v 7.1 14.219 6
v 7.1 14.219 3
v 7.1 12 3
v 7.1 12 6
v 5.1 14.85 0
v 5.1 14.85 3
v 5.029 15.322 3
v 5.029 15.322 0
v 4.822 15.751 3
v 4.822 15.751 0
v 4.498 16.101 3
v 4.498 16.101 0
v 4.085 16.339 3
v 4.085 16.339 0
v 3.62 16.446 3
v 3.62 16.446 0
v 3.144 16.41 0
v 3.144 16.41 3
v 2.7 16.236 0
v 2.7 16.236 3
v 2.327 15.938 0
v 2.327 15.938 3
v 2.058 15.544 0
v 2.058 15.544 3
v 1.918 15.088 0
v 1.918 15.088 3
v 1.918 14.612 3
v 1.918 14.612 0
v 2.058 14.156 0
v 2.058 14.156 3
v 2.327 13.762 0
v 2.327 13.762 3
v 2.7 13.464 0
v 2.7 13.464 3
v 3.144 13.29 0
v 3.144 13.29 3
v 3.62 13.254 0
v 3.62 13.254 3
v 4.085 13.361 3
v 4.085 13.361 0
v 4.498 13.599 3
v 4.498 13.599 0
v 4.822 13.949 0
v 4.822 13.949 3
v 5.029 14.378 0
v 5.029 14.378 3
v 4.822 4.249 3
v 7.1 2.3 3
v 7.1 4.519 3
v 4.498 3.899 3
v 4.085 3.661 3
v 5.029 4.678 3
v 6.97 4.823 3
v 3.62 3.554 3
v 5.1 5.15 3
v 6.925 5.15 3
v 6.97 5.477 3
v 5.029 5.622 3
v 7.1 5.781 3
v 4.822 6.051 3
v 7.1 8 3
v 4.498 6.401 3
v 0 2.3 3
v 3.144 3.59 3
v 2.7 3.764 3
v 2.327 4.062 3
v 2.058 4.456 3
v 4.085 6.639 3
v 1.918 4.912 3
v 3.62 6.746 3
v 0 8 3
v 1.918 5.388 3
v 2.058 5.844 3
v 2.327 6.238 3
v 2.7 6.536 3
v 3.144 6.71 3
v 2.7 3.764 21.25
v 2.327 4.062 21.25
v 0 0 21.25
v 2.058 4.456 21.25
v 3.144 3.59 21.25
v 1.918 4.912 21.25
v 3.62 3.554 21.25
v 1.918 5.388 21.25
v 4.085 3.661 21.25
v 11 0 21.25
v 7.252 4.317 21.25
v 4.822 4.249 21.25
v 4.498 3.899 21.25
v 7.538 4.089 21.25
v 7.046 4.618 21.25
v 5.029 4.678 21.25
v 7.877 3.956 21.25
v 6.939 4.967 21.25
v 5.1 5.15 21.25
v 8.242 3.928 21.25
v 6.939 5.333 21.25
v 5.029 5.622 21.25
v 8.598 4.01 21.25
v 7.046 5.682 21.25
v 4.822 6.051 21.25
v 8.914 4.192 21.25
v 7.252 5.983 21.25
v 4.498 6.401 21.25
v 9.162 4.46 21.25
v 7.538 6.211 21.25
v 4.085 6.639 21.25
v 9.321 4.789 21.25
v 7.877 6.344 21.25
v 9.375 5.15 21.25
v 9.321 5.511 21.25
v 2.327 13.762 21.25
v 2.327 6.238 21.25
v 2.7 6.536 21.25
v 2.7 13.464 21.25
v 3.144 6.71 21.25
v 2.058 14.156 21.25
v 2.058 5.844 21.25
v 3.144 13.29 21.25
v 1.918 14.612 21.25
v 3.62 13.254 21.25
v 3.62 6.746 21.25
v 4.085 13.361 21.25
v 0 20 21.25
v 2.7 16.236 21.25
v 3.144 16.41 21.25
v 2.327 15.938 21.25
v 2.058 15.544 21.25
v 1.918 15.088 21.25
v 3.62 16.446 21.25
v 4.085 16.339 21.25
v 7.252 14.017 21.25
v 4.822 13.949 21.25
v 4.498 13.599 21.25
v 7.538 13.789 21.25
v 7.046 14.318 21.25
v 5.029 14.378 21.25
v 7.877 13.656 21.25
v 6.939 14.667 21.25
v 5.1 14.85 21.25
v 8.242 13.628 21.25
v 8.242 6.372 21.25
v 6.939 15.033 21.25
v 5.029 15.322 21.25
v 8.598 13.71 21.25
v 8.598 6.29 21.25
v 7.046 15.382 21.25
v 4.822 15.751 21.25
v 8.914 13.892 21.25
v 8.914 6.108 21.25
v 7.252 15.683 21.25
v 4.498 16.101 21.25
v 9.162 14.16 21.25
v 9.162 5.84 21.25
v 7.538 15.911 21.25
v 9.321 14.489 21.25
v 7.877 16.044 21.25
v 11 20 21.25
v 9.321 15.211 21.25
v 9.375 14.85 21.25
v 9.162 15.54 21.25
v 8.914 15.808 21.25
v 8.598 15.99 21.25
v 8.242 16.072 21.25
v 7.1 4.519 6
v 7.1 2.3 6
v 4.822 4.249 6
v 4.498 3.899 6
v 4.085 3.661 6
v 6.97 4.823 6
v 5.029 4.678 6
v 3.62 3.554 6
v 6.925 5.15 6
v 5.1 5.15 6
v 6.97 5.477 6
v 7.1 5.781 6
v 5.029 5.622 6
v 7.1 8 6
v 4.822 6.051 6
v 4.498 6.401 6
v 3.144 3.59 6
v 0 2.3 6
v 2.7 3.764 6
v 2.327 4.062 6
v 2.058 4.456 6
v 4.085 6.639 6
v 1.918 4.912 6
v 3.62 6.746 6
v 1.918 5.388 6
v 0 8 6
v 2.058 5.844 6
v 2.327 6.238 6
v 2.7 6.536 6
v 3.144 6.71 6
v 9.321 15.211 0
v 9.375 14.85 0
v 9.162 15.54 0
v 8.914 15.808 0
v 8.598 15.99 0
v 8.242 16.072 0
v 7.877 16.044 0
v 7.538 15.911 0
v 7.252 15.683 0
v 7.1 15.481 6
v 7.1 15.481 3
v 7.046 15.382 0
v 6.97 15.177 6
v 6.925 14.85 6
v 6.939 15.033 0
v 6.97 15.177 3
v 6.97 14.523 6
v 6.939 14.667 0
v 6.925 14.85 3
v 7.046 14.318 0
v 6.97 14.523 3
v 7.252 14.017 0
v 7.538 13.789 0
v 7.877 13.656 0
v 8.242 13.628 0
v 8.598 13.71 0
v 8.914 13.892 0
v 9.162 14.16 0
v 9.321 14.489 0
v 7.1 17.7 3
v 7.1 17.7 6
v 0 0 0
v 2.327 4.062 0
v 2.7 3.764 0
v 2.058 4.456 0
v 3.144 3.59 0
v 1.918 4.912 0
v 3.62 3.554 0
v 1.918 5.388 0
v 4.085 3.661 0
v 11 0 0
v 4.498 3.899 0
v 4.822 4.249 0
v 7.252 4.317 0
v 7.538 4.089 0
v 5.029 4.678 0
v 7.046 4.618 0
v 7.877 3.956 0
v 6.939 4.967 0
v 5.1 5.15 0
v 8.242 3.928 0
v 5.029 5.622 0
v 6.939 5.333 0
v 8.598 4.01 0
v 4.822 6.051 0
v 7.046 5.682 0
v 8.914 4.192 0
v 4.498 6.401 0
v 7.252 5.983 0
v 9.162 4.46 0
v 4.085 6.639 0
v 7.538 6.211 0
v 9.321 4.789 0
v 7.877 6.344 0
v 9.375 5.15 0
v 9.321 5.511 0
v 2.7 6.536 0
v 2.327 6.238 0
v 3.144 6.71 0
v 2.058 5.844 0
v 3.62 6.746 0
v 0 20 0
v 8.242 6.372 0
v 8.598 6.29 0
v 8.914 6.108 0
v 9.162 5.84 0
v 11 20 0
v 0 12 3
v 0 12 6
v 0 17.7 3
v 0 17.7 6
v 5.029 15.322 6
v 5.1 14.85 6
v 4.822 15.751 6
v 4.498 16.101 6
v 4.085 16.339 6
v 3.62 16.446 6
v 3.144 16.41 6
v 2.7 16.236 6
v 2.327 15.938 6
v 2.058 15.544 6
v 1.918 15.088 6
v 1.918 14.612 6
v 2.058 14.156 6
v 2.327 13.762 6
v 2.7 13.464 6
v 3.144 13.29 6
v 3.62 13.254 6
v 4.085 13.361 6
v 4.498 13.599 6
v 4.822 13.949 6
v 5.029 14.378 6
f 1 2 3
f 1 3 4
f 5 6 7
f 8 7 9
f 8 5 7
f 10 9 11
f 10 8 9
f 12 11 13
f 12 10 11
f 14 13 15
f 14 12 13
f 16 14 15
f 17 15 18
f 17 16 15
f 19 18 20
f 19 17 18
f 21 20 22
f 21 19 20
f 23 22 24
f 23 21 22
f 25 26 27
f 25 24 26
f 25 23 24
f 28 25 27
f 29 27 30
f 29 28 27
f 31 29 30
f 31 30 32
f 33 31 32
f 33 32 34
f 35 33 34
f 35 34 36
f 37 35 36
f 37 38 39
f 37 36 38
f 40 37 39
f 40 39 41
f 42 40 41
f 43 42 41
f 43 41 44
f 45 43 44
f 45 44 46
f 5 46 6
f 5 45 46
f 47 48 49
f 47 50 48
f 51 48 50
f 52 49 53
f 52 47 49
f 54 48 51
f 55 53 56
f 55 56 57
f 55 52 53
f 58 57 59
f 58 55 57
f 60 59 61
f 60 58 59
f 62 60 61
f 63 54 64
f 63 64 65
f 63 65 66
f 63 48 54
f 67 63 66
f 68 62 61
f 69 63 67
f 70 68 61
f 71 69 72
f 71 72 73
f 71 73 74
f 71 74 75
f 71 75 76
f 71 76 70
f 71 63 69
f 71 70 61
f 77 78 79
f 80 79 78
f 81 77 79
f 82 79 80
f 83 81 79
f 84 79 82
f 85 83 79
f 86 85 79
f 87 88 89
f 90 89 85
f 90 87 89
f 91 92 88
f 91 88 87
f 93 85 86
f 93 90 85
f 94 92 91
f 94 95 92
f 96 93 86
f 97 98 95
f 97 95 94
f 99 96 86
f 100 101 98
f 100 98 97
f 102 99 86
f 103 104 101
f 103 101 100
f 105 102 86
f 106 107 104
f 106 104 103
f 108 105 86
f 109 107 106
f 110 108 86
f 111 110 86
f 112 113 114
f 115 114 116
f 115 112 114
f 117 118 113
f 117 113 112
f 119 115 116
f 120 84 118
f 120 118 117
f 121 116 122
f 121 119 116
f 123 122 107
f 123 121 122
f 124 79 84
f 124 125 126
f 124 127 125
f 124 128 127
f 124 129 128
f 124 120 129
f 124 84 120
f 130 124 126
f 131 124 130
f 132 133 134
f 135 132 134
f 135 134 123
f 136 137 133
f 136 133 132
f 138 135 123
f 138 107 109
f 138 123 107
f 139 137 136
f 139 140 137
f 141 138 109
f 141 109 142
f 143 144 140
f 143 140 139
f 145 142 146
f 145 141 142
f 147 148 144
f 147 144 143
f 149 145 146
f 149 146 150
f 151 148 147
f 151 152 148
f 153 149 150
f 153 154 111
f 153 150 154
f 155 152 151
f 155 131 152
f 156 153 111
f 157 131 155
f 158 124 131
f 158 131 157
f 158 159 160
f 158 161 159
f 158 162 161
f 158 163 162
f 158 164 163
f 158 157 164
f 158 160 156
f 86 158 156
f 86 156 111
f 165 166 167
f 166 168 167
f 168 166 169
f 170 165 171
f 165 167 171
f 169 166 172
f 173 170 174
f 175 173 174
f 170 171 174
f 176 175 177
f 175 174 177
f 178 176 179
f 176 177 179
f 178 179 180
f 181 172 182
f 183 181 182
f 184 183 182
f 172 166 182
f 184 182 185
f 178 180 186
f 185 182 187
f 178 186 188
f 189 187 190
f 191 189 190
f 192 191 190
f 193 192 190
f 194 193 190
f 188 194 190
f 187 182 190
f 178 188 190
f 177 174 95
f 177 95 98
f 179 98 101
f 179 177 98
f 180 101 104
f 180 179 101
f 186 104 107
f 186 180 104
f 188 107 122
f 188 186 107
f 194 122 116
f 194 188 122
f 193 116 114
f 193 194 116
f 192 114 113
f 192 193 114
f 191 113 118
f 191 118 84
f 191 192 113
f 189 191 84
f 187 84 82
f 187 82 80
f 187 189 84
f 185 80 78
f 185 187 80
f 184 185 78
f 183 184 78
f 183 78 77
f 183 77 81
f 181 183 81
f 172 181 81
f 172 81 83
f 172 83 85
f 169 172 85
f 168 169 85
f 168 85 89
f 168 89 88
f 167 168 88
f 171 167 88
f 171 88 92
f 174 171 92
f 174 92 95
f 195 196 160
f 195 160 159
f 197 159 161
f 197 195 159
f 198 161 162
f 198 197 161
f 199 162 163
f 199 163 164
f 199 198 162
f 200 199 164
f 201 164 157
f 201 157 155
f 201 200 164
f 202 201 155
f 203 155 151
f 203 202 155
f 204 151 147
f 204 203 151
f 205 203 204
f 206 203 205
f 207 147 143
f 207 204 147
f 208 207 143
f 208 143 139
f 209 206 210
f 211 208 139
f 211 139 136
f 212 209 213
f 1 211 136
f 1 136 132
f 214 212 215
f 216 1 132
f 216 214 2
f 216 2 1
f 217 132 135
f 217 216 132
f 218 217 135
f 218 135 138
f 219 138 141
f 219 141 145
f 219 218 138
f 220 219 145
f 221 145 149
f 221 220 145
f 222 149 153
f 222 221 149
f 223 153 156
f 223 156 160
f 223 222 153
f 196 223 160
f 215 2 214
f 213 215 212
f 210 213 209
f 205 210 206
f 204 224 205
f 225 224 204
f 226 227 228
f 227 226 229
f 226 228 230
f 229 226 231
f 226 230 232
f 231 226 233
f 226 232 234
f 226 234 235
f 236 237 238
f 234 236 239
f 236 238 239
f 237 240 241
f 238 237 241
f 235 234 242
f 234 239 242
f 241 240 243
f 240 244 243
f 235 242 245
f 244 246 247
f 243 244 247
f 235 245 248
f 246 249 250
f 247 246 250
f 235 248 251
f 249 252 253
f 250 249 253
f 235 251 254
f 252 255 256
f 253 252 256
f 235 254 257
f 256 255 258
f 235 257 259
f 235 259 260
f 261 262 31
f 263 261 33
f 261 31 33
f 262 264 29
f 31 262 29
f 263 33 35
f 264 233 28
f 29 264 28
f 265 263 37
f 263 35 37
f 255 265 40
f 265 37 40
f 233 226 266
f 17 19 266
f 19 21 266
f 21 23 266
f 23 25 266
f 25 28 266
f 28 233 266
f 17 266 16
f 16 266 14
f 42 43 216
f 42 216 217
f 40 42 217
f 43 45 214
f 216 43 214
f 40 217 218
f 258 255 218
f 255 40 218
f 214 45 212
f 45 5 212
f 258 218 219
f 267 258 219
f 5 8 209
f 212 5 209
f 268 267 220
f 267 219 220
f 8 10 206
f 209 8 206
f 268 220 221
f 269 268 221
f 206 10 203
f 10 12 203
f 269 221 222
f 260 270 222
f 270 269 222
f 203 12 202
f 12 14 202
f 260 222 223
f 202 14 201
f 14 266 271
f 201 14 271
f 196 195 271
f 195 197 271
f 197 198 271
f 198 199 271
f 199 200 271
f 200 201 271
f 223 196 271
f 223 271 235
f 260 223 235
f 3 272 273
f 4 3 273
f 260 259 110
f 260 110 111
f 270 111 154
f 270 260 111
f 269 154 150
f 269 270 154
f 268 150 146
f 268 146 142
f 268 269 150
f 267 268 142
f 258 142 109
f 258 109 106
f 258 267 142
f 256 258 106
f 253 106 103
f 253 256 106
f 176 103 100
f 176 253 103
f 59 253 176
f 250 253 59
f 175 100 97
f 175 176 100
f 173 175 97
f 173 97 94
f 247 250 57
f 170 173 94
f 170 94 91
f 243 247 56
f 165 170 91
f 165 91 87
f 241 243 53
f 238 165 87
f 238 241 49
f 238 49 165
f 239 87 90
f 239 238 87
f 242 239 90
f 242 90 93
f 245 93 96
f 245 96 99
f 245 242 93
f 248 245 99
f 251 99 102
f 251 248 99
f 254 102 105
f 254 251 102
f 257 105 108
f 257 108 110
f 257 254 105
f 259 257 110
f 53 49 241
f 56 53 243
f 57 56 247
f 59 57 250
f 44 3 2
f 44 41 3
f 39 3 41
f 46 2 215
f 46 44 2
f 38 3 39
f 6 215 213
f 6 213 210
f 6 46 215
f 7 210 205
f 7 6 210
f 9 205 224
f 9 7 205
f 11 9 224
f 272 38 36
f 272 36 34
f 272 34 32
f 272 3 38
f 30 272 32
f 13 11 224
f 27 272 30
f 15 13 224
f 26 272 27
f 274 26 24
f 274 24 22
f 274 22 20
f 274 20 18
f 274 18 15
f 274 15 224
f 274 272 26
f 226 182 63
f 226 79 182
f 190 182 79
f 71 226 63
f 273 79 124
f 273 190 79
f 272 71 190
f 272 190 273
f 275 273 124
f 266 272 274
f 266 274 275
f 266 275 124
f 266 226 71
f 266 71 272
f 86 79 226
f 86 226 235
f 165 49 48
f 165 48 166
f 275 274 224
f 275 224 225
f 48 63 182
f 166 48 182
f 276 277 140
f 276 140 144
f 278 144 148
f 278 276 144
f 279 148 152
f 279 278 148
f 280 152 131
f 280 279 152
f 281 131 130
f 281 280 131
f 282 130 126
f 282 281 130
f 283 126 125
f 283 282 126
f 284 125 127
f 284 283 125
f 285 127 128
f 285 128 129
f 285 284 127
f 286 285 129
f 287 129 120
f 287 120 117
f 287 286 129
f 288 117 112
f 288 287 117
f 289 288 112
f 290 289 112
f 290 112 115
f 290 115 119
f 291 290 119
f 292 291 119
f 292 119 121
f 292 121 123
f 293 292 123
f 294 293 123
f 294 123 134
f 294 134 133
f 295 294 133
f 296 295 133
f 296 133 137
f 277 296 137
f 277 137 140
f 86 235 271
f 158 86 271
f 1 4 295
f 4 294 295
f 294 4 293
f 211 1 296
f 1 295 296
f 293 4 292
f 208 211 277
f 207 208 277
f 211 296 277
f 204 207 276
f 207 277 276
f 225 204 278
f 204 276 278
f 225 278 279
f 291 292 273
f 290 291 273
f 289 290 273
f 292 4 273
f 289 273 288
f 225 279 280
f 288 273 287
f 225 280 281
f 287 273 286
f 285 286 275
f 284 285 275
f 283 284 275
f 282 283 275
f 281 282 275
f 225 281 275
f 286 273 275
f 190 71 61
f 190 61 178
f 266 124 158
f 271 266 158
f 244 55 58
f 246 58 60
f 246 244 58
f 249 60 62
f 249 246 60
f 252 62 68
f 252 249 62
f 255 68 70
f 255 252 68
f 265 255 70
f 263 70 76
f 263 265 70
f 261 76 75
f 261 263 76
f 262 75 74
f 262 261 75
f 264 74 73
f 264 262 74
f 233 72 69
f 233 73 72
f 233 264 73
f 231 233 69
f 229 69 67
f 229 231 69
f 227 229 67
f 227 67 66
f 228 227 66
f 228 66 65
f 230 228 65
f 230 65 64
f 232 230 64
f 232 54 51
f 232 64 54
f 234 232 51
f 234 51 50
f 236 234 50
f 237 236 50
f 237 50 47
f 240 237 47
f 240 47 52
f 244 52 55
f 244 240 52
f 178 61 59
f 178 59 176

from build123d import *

# Parameters (mm, degrees)
SKETCH_3_W          = 11
SKETCH_3_H          = 20
SKETCH_3_R          = 1.6
SKETCH_3_R_2        = 1.225
EXTRUDE_1_DEPTH     = 21.25
SKETCH_4_W          = 3
SKETCH_4_H          = 5.7
CUT_EXTRUDE_1_DEPTH = 7.1


with BuildPart() as part:
    # 草图3 → 凸台-拉伸1 (new body)
    with BuildSketch(Plane.XY):
        with Locations((5.5, 10)):
            Rectangle(SKETCH_3_W, SKETCH_3_H)
        with Locations((3.5, 14.85)):
            Circle(SKETCH_3_R, mode=Mode.SUBTRACT)
        with Locations((3.5, 5.15)):
            Circle(SKETCH_3_R, mode=Mode.SUBTRACT)
        with Locations((8.15, 14.85)):
            Circle(SKETCH_3_R_2, mode=Mode.SUBTRACT)
        with Locations((8.15, 5.15)):
            Circle(SKETCH_3_R_2, mode=Mode.SUBTRACT)
    extrude(amount=EXTRUDE_1_DEPTH)

    # 草图4 → 切除-拉伸1 (cut)
    with BuildSketch(Plane.ZY):
        with Locations((4.5, 14.85)):
            Rectangle(SKETCH_4_W, SKETCH_4_H)
        with Locations((4.5, 5.15)):
            Rectangle(SKETCH_4_W, SKETCH_4_H)
    extrude(amount=-CUT_EXTRUDE_1_DEPTH, mode=Mode.SUBTRACT)


solid = part.part
